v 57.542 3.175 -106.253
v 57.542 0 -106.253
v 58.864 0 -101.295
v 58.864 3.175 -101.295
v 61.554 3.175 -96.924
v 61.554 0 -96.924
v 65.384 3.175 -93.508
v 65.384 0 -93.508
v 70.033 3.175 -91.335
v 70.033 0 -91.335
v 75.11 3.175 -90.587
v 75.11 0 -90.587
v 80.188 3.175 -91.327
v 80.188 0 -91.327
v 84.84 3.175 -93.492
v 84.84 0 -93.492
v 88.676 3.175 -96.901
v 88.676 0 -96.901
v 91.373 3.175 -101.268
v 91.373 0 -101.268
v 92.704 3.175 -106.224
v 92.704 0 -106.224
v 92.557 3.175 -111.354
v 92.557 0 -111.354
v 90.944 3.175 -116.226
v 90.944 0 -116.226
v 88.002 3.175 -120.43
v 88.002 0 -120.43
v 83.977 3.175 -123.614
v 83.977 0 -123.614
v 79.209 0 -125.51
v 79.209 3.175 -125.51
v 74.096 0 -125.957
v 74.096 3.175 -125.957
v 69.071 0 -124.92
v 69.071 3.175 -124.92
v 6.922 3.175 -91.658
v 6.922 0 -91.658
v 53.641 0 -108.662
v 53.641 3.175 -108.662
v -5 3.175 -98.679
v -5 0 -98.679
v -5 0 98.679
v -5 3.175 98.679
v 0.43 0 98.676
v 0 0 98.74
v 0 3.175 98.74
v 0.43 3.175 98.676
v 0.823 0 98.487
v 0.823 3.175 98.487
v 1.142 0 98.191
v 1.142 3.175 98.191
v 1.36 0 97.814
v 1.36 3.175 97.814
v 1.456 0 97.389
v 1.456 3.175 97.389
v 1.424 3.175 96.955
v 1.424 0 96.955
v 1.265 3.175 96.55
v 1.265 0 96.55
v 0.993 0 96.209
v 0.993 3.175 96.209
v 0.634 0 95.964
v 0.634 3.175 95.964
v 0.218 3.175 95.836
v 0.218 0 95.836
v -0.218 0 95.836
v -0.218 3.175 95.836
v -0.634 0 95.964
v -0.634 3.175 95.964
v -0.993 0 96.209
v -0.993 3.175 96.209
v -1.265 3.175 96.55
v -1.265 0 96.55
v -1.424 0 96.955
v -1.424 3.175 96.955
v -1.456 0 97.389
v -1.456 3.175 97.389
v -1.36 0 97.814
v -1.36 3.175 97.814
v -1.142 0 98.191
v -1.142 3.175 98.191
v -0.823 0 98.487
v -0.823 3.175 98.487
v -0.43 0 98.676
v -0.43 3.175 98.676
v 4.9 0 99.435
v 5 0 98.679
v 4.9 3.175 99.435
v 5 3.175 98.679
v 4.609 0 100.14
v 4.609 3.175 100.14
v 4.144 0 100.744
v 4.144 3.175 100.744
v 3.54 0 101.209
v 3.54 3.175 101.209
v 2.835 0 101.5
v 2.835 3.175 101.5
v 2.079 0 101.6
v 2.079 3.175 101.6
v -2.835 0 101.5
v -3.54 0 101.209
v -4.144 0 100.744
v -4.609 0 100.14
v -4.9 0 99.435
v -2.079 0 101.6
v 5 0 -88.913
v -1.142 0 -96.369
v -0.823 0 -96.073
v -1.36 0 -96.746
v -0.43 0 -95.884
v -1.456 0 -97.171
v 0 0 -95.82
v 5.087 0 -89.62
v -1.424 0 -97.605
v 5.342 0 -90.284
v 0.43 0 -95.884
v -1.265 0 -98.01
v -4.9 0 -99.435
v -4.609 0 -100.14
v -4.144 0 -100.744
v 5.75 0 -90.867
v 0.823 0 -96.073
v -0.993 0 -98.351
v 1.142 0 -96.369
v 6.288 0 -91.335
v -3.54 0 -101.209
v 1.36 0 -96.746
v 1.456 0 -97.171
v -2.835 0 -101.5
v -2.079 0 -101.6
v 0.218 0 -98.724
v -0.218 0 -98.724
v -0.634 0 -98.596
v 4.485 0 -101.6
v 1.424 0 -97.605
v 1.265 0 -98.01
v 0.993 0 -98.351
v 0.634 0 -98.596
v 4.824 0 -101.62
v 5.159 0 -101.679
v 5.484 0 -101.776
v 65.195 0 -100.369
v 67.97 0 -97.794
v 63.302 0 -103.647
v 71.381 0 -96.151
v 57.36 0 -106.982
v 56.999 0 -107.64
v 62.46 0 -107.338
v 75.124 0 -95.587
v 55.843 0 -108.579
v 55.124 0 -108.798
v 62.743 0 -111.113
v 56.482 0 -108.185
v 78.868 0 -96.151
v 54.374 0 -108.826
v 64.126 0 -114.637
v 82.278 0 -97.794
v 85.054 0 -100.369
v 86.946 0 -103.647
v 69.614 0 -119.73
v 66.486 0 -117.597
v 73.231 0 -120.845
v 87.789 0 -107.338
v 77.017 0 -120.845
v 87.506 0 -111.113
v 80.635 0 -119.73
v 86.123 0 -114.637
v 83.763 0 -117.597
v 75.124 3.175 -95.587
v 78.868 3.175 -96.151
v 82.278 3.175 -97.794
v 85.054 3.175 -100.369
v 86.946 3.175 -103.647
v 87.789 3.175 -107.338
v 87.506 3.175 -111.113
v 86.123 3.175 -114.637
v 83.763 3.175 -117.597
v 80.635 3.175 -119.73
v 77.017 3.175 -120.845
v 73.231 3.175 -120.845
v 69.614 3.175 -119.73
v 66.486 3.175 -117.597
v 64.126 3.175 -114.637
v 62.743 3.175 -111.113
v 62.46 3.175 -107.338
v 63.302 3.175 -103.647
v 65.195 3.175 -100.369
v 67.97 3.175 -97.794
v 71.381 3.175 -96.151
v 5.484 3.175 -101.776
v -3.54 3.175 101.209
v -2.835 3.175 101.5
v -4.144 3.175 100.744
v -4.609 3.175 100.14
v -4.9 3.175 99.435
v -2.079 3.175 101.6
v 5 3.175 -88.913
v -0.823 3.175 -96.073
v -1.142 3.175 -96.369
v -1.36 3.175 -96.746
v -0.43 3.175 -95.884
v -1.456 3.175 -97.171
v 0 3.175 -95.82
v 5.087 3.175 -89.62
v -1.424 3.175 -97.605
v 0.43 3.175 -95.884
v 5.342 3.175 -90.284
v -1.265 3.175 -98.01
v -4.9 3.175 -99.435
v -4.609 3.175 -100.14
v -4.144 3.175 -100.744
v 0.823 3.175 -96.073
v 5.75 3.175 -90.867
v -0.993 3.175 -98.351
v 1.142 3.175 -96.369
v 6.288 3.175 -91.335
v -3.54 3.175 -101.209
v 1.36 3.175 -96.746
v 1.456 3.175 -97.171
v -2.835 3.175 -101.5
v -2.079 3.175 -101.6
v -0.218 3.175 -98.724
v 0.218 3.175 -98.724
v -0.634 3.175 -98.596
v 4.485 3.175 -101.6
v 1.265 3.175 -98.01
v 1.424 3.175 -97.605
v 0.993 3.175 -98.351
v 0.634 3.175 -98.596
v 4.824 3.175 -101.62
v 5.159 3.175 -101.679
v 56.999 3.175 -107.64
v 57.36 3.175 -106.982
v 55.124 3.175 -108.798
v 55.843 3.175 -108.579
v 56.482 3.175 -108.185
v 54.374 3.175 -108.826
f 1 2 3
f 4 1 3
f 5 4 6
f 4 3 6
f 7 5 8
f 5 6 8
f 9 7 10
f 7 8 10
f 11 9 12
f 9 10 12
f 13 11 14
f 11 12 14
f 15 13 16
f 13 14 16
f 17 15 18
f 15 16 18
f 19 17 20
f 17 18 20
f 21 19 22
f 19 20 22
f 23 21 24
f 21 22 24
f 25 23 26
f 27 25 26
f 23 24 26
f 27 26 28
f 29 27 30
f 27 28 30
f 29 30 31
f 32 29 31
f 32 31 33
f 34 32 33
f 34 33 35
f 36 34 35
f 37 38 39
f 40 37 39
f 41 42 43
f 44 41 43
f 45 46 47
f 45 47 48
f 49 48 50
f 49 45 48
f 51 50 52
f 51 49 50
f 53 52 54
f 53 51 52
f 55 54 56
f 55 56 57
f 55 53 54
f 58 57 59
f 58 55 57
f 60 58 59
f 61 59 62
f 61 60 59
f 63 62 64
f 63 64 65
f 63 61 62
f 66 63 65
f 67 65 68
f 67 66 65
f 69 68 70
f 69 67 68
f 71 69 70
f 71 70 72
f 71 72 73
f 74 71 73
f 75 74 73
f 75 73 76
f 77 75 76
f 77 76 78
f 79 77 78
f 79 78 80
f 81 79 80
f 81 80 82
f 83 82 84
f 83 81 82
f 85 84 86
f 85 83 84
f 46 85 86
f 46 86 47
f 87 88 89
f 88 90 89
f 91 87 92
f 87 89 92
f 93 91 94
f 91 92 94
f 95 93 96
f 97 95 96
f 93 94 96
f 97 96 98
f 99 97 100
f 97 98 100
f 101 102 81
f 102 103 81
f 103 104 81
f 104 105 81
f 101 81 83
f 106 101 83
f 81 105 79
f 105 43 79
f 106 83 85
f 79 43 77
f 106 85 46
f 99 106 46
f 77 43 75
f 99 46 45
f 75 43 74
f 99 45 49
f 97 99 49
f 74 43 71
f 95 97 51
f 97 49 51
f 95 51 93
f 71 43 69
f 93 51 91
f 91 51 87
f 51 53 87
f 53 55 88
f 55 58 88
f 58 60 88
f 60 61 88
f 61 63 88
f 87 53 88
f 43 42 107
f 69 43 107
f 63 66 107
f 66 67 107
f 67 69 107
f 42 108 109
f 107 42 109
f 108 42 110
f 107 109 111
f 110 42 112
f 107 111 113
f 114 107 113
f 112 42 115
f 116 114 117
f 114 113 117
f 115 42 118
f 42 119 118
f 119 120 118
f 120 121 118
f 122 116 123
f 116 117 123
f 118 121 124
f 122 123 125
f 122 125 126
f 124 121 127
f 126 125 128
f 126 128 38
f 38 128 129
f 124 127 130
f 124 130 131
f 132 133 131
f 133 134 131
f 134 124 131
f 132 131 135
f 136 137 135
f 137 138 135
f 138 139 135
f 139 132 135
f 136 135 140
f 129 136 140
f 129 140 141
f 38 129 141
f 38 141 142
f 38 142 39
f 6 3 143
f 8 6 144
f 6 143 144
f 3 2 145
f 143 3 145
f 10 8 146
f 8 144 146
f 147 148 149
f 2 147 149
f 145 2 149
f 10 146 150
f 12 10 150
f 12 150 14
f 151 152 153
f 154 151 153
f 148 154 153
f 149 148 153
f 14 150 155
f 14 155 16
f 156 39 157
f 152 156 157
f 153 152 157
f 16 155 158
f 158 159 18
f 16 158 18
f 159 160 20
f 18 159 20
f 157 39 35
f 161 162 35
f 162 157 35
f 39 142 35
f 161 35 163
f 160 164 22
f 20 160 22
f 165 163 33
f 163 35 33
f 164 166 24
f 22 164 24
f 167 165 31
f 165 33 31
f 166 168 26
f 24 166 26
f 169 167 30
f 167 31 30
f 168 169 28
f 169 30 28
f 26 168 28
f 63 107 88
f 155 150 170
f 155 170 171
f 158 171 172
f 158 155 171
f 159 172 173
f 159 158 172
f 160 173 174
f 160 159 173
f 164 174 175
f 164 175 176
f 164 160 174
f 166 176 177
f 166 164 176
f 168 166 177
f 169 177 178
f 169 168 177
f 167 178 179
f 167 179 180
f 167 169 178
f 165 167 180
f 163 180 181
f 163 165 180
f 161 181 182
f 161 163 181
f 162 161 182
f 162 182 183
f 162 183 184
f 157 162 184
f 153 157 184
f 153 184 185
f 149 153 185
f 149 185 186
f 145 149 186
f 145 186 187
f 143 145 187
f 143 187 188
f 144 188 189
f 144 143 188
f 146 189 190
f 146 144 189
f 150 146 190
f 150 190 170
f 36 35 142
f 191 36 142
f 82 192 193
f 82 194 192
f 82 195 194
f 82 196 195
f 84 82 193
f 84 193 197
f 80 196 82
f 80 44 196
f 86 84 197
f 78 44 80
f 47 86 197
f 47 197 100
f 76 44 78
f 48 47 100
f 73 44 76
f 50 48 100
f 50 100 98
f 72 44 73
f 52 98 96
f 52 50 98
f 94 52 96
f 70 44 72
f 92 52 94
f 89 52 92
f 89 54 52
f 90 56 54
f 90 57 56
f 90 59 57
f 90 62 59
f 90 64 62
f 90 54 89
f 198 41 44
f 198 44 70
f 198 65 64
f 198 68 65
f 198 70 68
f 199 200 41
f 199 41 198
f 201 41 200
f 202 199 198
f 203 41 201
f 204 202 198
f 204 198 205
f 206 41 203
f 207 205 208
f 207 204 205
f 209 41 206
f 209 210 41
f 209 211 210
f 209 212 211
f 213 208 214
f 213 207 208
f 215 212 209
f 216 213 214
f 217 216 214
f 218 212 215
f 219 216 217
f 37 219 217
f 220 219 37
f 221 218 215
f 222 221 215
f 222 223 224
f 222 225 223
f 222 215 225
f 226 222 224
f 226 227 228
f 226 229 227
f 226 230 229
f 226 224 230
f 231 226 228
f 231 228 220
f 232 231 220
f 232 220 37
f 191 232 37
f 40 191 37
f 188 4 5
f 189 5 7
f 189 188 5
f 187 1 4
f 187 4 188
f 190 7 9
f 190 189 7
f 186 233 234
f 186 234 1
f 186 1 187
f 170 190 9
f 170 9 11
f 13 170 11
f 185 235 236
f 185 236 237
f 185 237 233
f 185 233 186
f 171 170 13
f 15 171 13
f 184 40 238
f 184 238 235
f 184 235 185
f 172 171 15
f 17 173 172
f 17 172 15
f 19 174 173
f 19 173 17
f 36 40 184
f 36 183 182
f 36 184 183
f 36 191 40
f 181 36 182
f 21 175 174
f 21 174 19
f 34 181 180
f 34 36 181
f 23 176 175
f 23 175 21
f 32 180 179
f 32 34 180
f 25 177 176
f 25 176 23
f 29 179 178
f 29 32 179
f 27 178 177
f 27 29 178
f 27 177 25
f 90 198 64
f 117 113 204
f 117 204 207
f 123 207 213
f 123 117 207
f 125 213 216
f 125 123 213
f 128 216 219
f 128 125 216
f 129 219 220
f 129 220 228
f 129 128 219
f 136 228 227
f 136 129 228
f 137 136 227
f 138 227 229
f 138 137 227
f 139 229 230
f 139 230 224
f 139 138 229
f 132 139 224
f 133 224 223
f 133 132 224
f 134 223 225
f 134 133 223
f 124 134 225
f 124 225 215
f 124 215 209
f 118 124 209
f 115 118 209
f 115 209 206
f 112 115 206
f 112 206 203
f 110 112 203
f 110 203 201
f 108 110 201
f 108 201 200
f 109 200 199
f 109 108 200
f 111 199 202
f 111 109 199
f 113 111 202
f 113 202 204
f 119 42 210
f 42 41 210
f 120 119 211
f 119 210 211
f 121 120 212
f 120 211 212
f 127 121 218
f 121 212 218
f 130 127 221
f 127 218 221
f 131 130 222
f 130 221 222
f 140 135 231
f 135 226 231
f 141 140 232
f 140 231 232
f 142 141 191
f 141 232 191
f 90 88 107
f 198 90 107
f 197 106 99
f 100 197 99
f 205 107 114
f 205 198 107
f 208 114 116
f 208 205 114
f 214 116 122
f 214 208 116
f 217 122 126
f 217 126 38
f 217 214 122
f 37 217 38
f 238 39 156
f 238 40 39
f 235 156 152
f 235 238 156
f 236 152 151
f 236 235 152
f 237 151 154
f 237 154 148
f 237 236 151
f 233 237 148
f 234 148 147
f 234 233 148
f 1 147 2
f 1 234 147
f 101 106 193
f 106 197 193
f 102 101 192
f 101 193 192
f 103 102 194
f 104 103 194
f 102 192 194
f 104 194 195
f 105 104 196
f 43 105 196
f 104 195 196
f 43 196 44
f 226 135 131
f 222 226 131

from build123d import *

# Parameters (mm, degrees)
SKETCH1_R           = 1.4605
SKETCH1_R_2         = 12.7
BOSS_EXTRUDE1_DEPTH = 3.175
FILLET1_R           = 2.921


with BuildPart() as part:
    # Sketch1 → Boss-Extrude1 (new body)
    with BuildSketch(Plane(origin=(0, 0, 0), x_dir=(1, 0, 0), z_dir=(0, 1, 0))):
        with BuildLine():
            Line((5, -101.6), (5, 90.958222275))
            Line((5, 90.958222275), (57.514533832, 110.071949456))
            ThreePointArc((57.514533832, 110.071949456), (89.092337947, 97.415945766), (69.070568383, 124.919779784))
            Line((69.070568383, 124.919779784), (5, 101.6))
            Line((5, 101.6), (-5, 101.6))
            Line((-5, 101.6), (-5, -101.6))
            Line((-5, -101.6), (5, -101.6))
        make_face()
        with Locations(Location((0, -97.28, 0), (0, 0, 270))):
            Circle(SKETCH1_R, mode=Mode.SUBTRACT)
        with Locations(Location((0, 97.28, 0), (0, 0, 270))):
            Circle(SKETCH1_R, mode=Mode.SUBTRACT)
        with Locations(Location((75.12432492, 108.287220396, 0), (0, 0, 270))):
            Circle(SKETCH1_R_2, mode=Mode.SUBTRACT)
    extrude(amount=BOSS_EXTRUDE1_DEPTH)

    # Fillet1
    fillet1_edges = [part.edges().sort_by_distance(p)[0] for p in [
        (-5, 1.5875, 101.6),
        (-5, 1.5875, -101.6),
        (5, 1.5875, -101.6),
        (57.514533832, 1.5875, -110.071949456),
        (5, 1.5875, -90.958222275),
        (5, 1.5875, 101.6),
    ]]
    fillet(fillet1_edges, radius=FILLET1_R)


solid = part.part
